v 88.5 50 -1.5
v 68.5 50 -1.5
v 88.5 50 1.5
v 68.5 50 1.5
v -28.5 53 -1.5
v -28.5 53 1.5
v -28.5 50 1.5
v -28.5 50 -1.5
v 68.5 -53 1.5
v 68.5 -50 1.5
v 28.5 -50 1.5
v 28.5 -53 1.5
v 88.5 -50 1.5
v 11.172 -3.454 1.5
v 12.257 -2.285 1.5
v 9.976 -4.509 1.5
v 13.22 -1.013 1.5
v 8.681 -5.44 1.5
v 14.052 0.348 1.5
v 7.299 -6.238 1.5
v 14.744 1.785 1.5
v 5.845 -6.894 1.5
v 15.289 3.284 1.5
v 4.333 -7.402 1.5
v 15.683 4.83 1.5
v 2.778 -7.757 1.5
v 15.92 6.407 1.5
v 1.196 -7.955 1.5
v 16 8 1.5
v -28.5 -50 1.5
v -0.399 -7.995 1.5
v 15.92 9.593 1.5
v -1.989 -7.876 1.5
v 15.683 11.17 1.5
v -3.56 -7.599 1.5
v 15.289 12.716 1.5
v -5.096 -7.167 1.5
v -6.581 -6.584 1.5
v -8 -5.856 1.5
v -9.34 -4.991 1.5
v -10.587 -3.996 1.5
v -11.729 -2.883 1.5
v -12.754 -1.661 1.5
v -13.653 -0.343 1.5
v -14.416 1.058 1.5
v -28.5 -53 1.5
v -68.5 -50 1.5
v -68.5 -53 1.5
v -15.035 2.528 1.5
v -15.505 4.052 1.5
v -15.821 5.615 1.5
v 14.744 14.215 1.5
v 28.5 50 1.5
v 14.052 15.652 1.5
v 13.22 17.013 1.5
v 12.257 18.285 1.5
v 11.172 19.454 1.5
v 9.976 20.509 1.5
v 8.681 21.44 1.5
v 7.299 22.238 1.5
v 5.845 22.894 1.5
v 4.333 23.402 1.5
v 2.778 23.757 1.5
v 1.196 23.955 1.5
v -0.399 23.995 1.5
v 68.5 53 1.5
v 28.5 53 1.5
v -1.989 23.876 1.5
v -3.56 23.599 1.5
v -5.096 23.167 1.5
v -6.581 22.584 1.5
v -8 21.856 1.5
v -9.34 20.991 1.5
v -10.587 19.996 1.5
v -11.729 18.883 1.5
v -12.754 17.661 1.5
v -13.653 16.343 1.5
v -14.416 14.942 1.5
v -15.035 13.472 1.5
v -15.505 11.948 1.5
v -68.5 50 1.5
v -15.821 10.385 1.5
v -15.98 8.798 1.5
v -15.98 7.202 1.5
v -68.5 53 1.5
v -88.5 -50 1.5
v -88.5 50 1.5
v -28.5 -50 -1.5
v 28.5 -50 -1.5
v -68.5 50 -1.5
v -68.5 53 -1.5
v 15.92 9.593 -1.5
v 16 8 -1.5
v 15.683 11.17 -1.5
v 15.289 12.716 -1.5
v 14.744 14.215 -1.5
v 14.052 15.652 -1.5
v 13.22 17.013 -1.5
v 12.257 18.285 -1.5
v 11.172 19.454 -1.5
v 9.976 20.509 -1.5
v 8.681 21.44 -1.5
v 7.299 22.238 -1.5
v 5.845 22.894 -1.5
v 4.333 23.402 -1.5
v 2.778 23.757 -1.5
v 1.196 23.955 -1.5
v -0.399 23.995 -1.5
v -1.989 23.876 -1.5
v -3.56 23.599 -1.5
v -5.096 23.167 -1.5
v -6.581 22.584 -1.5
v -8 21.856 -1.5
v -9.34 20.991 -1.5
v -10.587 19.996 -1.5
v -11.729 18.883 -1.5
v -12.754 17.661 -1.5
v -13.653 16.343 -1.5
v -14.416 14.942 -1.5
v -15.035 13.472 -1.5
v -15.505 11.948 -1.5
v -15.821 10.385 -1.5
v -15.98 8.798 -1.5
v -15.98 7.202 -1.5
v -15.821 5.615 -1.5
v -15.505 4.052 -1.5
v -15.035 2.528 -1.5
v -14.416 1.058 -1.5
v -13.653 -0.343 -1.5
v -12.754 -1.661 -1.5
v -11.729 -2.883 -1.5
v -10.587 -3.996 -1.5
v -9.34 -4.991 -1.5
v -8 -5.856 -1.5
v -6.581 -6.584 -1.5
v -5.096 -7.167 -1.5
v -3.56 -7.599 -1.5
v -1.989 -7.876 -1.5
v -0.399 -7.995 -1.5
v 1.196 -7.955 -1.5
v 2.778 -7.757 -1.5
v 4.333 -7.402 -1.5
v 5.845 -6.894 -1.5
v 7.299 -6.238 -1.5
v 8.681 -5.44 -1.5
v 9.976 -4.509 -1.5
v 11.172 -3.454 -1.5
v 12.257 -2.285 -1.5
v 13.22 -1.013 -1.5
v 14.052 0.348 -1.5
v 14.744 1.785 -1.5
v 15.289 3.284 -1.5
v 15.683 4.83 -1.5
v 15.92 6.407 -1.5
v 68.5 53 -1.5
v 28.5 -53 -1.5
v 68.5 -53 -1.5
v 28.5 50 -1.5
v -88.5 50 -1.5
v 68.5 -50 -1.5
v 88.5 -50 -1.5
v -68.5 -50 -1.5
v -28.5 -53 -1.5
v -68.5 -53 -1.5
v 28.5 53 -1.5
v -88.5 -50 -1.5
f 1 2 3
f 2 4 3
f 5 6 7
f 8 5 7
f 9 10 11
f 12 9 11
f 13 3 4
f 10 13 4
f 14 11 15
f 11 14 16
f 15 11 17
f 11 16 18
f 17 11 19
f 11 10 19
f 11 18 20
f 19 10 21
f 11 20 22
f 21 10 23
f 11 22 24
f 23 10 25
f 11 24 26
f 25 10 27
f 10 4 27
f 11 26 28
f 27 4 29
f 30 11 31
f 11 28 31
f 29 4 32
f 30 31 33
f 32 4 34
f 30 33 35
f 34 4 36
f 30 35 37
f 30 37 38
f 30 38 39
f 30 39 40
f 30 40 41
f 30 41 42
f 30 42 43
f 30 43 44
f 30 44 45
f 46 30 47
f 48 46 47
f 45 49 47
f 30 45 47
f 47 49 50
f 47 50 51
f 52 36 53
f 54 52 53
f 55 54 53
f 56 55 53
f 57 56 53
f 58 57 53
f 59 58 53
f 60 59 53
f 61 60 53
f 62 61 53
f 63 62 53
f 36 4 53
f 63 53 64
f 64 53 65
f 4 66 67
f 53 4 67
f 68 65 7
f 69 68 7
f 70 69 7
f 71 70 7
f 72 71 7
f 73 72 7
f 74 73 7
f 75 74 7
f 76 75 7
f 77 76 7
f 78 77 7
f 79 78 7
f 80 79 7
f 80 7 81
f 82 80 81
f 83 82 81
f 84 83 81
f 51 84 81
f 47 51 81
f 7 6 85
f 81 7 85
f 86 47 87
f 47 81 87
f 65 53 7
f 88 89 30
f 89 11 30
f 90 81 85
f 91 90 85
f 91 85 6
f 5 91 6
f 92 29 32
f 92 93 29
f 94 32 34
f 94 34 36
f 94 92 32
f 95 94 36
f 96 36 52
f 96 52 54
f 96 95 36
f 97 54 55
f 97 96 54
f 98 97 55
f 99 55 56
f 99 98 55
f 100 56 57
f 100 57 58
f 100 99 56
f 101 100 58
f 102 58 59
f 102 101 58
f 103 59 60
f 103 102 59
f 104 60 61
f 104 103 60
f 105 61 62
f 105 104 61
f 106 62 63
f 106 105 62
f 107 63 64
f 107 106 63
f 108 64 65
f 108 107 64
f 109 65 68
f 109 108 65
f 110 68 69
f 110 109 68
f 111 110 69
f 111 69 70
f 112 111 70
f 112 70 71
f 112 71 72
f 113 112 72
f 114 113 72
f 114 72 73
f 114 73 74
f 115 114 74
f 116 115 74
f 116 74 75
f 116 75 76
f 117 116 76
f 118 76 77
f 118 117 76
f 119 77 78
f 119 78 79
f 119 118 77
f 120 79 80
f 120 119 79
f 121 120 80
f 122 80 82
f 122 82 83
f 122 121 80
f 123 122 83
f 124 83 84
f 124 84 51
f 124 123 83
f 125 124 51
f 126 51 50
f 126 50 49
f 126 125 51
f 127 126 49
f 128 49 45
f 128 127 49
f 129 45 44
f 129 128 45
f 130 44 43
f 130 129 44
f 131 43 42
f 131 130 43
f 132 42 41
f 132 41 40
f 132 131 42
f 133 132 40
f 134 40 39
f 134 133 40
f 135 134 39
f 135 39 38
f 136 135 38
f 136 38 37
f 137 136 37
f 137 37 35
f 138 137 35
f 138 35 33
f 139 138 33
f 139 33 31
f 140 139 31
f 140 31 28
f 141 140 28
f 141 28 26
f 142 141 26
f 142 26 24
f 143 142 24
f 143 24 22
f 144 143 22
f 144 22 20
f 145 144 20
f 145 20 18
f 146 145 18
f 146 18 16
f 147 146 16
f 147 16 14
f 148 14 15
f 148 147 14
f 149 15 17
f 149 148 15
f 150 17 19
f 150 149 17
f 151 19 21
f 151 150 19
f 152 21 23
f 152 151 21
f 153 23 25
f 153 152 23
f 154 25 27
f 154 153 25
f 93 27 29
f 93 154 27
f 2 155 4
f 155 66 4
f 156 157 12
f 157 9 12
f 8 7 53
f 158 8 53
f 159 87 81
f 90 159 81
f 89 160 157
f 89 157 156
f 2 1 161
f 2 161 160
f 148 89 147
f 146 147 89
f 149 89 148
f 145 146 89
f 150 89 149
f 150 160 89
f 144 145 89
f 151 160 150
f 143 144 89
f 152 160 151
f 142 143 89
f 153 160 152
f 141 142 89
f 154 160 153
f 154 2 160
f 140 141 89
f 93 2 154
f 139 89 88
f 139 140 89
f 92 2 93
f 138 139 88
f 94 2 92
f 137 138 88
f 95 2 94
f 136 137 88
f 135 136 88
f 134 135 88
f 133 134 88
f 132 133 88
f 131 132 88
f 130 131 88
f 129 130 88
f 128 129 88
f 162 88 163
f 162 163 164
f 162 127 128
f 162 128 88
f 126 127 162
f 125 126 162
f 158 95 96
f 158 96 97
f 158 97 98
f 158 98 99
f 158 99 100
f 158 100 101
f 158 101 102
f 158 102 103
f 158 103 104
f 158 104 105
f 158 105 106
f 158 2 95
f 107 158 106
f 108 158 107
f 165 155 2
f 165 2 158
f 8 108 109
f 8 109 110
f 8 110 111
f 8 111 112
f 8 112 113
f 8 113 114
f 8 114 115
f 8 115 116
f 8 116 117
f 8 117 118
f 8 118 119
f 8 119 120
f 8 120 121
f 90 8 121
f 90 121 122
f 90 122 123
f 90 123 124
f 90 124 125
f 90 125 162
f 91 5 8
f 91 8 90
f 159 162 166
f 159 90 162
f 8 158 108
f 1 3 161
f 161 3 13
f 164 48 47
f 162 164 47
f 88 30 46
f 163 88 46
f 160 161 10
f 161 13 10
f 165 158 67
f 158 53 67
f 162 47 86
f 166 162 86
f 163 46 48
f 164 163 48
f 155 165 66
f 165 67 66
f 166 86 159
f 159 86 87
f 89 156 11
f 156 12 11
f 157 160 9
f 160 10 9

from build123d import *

# Parameters (mm, degrees)
SKETCH1_R           = 16
BOSS_EXTRUDE1_DEPTH = 1.5


with BuildPart() as part:
    # Sketch1 → Boss-Extrude1 (new body, symmetric)
    with BuildSketch(Plane.XY):
        Polygon((-28.5, 50), (28.5, 50), (28.5, 53), (68.5, 53), (68.5, 50), (88.5, 50), (88.5, -50), (68.5, -50), (68.5, -53), (28.5, -53), (28.5, -50), (-28.5, -50), (-28.5, -53), (-68.5, -53), (-68.5, -50), (-88.5, -50), (-88.5, 50), (-68.5, 50), (-68.5, 53), (-28.5, 53), align=None)
        with Locations((0, 8)):
            Circle(SKETCH1_R, mode=Mode.SUBTRACT)
    extrude(amount=BOSS_EXTRUDE1_DEPTH, both=True)


solid = part.part
